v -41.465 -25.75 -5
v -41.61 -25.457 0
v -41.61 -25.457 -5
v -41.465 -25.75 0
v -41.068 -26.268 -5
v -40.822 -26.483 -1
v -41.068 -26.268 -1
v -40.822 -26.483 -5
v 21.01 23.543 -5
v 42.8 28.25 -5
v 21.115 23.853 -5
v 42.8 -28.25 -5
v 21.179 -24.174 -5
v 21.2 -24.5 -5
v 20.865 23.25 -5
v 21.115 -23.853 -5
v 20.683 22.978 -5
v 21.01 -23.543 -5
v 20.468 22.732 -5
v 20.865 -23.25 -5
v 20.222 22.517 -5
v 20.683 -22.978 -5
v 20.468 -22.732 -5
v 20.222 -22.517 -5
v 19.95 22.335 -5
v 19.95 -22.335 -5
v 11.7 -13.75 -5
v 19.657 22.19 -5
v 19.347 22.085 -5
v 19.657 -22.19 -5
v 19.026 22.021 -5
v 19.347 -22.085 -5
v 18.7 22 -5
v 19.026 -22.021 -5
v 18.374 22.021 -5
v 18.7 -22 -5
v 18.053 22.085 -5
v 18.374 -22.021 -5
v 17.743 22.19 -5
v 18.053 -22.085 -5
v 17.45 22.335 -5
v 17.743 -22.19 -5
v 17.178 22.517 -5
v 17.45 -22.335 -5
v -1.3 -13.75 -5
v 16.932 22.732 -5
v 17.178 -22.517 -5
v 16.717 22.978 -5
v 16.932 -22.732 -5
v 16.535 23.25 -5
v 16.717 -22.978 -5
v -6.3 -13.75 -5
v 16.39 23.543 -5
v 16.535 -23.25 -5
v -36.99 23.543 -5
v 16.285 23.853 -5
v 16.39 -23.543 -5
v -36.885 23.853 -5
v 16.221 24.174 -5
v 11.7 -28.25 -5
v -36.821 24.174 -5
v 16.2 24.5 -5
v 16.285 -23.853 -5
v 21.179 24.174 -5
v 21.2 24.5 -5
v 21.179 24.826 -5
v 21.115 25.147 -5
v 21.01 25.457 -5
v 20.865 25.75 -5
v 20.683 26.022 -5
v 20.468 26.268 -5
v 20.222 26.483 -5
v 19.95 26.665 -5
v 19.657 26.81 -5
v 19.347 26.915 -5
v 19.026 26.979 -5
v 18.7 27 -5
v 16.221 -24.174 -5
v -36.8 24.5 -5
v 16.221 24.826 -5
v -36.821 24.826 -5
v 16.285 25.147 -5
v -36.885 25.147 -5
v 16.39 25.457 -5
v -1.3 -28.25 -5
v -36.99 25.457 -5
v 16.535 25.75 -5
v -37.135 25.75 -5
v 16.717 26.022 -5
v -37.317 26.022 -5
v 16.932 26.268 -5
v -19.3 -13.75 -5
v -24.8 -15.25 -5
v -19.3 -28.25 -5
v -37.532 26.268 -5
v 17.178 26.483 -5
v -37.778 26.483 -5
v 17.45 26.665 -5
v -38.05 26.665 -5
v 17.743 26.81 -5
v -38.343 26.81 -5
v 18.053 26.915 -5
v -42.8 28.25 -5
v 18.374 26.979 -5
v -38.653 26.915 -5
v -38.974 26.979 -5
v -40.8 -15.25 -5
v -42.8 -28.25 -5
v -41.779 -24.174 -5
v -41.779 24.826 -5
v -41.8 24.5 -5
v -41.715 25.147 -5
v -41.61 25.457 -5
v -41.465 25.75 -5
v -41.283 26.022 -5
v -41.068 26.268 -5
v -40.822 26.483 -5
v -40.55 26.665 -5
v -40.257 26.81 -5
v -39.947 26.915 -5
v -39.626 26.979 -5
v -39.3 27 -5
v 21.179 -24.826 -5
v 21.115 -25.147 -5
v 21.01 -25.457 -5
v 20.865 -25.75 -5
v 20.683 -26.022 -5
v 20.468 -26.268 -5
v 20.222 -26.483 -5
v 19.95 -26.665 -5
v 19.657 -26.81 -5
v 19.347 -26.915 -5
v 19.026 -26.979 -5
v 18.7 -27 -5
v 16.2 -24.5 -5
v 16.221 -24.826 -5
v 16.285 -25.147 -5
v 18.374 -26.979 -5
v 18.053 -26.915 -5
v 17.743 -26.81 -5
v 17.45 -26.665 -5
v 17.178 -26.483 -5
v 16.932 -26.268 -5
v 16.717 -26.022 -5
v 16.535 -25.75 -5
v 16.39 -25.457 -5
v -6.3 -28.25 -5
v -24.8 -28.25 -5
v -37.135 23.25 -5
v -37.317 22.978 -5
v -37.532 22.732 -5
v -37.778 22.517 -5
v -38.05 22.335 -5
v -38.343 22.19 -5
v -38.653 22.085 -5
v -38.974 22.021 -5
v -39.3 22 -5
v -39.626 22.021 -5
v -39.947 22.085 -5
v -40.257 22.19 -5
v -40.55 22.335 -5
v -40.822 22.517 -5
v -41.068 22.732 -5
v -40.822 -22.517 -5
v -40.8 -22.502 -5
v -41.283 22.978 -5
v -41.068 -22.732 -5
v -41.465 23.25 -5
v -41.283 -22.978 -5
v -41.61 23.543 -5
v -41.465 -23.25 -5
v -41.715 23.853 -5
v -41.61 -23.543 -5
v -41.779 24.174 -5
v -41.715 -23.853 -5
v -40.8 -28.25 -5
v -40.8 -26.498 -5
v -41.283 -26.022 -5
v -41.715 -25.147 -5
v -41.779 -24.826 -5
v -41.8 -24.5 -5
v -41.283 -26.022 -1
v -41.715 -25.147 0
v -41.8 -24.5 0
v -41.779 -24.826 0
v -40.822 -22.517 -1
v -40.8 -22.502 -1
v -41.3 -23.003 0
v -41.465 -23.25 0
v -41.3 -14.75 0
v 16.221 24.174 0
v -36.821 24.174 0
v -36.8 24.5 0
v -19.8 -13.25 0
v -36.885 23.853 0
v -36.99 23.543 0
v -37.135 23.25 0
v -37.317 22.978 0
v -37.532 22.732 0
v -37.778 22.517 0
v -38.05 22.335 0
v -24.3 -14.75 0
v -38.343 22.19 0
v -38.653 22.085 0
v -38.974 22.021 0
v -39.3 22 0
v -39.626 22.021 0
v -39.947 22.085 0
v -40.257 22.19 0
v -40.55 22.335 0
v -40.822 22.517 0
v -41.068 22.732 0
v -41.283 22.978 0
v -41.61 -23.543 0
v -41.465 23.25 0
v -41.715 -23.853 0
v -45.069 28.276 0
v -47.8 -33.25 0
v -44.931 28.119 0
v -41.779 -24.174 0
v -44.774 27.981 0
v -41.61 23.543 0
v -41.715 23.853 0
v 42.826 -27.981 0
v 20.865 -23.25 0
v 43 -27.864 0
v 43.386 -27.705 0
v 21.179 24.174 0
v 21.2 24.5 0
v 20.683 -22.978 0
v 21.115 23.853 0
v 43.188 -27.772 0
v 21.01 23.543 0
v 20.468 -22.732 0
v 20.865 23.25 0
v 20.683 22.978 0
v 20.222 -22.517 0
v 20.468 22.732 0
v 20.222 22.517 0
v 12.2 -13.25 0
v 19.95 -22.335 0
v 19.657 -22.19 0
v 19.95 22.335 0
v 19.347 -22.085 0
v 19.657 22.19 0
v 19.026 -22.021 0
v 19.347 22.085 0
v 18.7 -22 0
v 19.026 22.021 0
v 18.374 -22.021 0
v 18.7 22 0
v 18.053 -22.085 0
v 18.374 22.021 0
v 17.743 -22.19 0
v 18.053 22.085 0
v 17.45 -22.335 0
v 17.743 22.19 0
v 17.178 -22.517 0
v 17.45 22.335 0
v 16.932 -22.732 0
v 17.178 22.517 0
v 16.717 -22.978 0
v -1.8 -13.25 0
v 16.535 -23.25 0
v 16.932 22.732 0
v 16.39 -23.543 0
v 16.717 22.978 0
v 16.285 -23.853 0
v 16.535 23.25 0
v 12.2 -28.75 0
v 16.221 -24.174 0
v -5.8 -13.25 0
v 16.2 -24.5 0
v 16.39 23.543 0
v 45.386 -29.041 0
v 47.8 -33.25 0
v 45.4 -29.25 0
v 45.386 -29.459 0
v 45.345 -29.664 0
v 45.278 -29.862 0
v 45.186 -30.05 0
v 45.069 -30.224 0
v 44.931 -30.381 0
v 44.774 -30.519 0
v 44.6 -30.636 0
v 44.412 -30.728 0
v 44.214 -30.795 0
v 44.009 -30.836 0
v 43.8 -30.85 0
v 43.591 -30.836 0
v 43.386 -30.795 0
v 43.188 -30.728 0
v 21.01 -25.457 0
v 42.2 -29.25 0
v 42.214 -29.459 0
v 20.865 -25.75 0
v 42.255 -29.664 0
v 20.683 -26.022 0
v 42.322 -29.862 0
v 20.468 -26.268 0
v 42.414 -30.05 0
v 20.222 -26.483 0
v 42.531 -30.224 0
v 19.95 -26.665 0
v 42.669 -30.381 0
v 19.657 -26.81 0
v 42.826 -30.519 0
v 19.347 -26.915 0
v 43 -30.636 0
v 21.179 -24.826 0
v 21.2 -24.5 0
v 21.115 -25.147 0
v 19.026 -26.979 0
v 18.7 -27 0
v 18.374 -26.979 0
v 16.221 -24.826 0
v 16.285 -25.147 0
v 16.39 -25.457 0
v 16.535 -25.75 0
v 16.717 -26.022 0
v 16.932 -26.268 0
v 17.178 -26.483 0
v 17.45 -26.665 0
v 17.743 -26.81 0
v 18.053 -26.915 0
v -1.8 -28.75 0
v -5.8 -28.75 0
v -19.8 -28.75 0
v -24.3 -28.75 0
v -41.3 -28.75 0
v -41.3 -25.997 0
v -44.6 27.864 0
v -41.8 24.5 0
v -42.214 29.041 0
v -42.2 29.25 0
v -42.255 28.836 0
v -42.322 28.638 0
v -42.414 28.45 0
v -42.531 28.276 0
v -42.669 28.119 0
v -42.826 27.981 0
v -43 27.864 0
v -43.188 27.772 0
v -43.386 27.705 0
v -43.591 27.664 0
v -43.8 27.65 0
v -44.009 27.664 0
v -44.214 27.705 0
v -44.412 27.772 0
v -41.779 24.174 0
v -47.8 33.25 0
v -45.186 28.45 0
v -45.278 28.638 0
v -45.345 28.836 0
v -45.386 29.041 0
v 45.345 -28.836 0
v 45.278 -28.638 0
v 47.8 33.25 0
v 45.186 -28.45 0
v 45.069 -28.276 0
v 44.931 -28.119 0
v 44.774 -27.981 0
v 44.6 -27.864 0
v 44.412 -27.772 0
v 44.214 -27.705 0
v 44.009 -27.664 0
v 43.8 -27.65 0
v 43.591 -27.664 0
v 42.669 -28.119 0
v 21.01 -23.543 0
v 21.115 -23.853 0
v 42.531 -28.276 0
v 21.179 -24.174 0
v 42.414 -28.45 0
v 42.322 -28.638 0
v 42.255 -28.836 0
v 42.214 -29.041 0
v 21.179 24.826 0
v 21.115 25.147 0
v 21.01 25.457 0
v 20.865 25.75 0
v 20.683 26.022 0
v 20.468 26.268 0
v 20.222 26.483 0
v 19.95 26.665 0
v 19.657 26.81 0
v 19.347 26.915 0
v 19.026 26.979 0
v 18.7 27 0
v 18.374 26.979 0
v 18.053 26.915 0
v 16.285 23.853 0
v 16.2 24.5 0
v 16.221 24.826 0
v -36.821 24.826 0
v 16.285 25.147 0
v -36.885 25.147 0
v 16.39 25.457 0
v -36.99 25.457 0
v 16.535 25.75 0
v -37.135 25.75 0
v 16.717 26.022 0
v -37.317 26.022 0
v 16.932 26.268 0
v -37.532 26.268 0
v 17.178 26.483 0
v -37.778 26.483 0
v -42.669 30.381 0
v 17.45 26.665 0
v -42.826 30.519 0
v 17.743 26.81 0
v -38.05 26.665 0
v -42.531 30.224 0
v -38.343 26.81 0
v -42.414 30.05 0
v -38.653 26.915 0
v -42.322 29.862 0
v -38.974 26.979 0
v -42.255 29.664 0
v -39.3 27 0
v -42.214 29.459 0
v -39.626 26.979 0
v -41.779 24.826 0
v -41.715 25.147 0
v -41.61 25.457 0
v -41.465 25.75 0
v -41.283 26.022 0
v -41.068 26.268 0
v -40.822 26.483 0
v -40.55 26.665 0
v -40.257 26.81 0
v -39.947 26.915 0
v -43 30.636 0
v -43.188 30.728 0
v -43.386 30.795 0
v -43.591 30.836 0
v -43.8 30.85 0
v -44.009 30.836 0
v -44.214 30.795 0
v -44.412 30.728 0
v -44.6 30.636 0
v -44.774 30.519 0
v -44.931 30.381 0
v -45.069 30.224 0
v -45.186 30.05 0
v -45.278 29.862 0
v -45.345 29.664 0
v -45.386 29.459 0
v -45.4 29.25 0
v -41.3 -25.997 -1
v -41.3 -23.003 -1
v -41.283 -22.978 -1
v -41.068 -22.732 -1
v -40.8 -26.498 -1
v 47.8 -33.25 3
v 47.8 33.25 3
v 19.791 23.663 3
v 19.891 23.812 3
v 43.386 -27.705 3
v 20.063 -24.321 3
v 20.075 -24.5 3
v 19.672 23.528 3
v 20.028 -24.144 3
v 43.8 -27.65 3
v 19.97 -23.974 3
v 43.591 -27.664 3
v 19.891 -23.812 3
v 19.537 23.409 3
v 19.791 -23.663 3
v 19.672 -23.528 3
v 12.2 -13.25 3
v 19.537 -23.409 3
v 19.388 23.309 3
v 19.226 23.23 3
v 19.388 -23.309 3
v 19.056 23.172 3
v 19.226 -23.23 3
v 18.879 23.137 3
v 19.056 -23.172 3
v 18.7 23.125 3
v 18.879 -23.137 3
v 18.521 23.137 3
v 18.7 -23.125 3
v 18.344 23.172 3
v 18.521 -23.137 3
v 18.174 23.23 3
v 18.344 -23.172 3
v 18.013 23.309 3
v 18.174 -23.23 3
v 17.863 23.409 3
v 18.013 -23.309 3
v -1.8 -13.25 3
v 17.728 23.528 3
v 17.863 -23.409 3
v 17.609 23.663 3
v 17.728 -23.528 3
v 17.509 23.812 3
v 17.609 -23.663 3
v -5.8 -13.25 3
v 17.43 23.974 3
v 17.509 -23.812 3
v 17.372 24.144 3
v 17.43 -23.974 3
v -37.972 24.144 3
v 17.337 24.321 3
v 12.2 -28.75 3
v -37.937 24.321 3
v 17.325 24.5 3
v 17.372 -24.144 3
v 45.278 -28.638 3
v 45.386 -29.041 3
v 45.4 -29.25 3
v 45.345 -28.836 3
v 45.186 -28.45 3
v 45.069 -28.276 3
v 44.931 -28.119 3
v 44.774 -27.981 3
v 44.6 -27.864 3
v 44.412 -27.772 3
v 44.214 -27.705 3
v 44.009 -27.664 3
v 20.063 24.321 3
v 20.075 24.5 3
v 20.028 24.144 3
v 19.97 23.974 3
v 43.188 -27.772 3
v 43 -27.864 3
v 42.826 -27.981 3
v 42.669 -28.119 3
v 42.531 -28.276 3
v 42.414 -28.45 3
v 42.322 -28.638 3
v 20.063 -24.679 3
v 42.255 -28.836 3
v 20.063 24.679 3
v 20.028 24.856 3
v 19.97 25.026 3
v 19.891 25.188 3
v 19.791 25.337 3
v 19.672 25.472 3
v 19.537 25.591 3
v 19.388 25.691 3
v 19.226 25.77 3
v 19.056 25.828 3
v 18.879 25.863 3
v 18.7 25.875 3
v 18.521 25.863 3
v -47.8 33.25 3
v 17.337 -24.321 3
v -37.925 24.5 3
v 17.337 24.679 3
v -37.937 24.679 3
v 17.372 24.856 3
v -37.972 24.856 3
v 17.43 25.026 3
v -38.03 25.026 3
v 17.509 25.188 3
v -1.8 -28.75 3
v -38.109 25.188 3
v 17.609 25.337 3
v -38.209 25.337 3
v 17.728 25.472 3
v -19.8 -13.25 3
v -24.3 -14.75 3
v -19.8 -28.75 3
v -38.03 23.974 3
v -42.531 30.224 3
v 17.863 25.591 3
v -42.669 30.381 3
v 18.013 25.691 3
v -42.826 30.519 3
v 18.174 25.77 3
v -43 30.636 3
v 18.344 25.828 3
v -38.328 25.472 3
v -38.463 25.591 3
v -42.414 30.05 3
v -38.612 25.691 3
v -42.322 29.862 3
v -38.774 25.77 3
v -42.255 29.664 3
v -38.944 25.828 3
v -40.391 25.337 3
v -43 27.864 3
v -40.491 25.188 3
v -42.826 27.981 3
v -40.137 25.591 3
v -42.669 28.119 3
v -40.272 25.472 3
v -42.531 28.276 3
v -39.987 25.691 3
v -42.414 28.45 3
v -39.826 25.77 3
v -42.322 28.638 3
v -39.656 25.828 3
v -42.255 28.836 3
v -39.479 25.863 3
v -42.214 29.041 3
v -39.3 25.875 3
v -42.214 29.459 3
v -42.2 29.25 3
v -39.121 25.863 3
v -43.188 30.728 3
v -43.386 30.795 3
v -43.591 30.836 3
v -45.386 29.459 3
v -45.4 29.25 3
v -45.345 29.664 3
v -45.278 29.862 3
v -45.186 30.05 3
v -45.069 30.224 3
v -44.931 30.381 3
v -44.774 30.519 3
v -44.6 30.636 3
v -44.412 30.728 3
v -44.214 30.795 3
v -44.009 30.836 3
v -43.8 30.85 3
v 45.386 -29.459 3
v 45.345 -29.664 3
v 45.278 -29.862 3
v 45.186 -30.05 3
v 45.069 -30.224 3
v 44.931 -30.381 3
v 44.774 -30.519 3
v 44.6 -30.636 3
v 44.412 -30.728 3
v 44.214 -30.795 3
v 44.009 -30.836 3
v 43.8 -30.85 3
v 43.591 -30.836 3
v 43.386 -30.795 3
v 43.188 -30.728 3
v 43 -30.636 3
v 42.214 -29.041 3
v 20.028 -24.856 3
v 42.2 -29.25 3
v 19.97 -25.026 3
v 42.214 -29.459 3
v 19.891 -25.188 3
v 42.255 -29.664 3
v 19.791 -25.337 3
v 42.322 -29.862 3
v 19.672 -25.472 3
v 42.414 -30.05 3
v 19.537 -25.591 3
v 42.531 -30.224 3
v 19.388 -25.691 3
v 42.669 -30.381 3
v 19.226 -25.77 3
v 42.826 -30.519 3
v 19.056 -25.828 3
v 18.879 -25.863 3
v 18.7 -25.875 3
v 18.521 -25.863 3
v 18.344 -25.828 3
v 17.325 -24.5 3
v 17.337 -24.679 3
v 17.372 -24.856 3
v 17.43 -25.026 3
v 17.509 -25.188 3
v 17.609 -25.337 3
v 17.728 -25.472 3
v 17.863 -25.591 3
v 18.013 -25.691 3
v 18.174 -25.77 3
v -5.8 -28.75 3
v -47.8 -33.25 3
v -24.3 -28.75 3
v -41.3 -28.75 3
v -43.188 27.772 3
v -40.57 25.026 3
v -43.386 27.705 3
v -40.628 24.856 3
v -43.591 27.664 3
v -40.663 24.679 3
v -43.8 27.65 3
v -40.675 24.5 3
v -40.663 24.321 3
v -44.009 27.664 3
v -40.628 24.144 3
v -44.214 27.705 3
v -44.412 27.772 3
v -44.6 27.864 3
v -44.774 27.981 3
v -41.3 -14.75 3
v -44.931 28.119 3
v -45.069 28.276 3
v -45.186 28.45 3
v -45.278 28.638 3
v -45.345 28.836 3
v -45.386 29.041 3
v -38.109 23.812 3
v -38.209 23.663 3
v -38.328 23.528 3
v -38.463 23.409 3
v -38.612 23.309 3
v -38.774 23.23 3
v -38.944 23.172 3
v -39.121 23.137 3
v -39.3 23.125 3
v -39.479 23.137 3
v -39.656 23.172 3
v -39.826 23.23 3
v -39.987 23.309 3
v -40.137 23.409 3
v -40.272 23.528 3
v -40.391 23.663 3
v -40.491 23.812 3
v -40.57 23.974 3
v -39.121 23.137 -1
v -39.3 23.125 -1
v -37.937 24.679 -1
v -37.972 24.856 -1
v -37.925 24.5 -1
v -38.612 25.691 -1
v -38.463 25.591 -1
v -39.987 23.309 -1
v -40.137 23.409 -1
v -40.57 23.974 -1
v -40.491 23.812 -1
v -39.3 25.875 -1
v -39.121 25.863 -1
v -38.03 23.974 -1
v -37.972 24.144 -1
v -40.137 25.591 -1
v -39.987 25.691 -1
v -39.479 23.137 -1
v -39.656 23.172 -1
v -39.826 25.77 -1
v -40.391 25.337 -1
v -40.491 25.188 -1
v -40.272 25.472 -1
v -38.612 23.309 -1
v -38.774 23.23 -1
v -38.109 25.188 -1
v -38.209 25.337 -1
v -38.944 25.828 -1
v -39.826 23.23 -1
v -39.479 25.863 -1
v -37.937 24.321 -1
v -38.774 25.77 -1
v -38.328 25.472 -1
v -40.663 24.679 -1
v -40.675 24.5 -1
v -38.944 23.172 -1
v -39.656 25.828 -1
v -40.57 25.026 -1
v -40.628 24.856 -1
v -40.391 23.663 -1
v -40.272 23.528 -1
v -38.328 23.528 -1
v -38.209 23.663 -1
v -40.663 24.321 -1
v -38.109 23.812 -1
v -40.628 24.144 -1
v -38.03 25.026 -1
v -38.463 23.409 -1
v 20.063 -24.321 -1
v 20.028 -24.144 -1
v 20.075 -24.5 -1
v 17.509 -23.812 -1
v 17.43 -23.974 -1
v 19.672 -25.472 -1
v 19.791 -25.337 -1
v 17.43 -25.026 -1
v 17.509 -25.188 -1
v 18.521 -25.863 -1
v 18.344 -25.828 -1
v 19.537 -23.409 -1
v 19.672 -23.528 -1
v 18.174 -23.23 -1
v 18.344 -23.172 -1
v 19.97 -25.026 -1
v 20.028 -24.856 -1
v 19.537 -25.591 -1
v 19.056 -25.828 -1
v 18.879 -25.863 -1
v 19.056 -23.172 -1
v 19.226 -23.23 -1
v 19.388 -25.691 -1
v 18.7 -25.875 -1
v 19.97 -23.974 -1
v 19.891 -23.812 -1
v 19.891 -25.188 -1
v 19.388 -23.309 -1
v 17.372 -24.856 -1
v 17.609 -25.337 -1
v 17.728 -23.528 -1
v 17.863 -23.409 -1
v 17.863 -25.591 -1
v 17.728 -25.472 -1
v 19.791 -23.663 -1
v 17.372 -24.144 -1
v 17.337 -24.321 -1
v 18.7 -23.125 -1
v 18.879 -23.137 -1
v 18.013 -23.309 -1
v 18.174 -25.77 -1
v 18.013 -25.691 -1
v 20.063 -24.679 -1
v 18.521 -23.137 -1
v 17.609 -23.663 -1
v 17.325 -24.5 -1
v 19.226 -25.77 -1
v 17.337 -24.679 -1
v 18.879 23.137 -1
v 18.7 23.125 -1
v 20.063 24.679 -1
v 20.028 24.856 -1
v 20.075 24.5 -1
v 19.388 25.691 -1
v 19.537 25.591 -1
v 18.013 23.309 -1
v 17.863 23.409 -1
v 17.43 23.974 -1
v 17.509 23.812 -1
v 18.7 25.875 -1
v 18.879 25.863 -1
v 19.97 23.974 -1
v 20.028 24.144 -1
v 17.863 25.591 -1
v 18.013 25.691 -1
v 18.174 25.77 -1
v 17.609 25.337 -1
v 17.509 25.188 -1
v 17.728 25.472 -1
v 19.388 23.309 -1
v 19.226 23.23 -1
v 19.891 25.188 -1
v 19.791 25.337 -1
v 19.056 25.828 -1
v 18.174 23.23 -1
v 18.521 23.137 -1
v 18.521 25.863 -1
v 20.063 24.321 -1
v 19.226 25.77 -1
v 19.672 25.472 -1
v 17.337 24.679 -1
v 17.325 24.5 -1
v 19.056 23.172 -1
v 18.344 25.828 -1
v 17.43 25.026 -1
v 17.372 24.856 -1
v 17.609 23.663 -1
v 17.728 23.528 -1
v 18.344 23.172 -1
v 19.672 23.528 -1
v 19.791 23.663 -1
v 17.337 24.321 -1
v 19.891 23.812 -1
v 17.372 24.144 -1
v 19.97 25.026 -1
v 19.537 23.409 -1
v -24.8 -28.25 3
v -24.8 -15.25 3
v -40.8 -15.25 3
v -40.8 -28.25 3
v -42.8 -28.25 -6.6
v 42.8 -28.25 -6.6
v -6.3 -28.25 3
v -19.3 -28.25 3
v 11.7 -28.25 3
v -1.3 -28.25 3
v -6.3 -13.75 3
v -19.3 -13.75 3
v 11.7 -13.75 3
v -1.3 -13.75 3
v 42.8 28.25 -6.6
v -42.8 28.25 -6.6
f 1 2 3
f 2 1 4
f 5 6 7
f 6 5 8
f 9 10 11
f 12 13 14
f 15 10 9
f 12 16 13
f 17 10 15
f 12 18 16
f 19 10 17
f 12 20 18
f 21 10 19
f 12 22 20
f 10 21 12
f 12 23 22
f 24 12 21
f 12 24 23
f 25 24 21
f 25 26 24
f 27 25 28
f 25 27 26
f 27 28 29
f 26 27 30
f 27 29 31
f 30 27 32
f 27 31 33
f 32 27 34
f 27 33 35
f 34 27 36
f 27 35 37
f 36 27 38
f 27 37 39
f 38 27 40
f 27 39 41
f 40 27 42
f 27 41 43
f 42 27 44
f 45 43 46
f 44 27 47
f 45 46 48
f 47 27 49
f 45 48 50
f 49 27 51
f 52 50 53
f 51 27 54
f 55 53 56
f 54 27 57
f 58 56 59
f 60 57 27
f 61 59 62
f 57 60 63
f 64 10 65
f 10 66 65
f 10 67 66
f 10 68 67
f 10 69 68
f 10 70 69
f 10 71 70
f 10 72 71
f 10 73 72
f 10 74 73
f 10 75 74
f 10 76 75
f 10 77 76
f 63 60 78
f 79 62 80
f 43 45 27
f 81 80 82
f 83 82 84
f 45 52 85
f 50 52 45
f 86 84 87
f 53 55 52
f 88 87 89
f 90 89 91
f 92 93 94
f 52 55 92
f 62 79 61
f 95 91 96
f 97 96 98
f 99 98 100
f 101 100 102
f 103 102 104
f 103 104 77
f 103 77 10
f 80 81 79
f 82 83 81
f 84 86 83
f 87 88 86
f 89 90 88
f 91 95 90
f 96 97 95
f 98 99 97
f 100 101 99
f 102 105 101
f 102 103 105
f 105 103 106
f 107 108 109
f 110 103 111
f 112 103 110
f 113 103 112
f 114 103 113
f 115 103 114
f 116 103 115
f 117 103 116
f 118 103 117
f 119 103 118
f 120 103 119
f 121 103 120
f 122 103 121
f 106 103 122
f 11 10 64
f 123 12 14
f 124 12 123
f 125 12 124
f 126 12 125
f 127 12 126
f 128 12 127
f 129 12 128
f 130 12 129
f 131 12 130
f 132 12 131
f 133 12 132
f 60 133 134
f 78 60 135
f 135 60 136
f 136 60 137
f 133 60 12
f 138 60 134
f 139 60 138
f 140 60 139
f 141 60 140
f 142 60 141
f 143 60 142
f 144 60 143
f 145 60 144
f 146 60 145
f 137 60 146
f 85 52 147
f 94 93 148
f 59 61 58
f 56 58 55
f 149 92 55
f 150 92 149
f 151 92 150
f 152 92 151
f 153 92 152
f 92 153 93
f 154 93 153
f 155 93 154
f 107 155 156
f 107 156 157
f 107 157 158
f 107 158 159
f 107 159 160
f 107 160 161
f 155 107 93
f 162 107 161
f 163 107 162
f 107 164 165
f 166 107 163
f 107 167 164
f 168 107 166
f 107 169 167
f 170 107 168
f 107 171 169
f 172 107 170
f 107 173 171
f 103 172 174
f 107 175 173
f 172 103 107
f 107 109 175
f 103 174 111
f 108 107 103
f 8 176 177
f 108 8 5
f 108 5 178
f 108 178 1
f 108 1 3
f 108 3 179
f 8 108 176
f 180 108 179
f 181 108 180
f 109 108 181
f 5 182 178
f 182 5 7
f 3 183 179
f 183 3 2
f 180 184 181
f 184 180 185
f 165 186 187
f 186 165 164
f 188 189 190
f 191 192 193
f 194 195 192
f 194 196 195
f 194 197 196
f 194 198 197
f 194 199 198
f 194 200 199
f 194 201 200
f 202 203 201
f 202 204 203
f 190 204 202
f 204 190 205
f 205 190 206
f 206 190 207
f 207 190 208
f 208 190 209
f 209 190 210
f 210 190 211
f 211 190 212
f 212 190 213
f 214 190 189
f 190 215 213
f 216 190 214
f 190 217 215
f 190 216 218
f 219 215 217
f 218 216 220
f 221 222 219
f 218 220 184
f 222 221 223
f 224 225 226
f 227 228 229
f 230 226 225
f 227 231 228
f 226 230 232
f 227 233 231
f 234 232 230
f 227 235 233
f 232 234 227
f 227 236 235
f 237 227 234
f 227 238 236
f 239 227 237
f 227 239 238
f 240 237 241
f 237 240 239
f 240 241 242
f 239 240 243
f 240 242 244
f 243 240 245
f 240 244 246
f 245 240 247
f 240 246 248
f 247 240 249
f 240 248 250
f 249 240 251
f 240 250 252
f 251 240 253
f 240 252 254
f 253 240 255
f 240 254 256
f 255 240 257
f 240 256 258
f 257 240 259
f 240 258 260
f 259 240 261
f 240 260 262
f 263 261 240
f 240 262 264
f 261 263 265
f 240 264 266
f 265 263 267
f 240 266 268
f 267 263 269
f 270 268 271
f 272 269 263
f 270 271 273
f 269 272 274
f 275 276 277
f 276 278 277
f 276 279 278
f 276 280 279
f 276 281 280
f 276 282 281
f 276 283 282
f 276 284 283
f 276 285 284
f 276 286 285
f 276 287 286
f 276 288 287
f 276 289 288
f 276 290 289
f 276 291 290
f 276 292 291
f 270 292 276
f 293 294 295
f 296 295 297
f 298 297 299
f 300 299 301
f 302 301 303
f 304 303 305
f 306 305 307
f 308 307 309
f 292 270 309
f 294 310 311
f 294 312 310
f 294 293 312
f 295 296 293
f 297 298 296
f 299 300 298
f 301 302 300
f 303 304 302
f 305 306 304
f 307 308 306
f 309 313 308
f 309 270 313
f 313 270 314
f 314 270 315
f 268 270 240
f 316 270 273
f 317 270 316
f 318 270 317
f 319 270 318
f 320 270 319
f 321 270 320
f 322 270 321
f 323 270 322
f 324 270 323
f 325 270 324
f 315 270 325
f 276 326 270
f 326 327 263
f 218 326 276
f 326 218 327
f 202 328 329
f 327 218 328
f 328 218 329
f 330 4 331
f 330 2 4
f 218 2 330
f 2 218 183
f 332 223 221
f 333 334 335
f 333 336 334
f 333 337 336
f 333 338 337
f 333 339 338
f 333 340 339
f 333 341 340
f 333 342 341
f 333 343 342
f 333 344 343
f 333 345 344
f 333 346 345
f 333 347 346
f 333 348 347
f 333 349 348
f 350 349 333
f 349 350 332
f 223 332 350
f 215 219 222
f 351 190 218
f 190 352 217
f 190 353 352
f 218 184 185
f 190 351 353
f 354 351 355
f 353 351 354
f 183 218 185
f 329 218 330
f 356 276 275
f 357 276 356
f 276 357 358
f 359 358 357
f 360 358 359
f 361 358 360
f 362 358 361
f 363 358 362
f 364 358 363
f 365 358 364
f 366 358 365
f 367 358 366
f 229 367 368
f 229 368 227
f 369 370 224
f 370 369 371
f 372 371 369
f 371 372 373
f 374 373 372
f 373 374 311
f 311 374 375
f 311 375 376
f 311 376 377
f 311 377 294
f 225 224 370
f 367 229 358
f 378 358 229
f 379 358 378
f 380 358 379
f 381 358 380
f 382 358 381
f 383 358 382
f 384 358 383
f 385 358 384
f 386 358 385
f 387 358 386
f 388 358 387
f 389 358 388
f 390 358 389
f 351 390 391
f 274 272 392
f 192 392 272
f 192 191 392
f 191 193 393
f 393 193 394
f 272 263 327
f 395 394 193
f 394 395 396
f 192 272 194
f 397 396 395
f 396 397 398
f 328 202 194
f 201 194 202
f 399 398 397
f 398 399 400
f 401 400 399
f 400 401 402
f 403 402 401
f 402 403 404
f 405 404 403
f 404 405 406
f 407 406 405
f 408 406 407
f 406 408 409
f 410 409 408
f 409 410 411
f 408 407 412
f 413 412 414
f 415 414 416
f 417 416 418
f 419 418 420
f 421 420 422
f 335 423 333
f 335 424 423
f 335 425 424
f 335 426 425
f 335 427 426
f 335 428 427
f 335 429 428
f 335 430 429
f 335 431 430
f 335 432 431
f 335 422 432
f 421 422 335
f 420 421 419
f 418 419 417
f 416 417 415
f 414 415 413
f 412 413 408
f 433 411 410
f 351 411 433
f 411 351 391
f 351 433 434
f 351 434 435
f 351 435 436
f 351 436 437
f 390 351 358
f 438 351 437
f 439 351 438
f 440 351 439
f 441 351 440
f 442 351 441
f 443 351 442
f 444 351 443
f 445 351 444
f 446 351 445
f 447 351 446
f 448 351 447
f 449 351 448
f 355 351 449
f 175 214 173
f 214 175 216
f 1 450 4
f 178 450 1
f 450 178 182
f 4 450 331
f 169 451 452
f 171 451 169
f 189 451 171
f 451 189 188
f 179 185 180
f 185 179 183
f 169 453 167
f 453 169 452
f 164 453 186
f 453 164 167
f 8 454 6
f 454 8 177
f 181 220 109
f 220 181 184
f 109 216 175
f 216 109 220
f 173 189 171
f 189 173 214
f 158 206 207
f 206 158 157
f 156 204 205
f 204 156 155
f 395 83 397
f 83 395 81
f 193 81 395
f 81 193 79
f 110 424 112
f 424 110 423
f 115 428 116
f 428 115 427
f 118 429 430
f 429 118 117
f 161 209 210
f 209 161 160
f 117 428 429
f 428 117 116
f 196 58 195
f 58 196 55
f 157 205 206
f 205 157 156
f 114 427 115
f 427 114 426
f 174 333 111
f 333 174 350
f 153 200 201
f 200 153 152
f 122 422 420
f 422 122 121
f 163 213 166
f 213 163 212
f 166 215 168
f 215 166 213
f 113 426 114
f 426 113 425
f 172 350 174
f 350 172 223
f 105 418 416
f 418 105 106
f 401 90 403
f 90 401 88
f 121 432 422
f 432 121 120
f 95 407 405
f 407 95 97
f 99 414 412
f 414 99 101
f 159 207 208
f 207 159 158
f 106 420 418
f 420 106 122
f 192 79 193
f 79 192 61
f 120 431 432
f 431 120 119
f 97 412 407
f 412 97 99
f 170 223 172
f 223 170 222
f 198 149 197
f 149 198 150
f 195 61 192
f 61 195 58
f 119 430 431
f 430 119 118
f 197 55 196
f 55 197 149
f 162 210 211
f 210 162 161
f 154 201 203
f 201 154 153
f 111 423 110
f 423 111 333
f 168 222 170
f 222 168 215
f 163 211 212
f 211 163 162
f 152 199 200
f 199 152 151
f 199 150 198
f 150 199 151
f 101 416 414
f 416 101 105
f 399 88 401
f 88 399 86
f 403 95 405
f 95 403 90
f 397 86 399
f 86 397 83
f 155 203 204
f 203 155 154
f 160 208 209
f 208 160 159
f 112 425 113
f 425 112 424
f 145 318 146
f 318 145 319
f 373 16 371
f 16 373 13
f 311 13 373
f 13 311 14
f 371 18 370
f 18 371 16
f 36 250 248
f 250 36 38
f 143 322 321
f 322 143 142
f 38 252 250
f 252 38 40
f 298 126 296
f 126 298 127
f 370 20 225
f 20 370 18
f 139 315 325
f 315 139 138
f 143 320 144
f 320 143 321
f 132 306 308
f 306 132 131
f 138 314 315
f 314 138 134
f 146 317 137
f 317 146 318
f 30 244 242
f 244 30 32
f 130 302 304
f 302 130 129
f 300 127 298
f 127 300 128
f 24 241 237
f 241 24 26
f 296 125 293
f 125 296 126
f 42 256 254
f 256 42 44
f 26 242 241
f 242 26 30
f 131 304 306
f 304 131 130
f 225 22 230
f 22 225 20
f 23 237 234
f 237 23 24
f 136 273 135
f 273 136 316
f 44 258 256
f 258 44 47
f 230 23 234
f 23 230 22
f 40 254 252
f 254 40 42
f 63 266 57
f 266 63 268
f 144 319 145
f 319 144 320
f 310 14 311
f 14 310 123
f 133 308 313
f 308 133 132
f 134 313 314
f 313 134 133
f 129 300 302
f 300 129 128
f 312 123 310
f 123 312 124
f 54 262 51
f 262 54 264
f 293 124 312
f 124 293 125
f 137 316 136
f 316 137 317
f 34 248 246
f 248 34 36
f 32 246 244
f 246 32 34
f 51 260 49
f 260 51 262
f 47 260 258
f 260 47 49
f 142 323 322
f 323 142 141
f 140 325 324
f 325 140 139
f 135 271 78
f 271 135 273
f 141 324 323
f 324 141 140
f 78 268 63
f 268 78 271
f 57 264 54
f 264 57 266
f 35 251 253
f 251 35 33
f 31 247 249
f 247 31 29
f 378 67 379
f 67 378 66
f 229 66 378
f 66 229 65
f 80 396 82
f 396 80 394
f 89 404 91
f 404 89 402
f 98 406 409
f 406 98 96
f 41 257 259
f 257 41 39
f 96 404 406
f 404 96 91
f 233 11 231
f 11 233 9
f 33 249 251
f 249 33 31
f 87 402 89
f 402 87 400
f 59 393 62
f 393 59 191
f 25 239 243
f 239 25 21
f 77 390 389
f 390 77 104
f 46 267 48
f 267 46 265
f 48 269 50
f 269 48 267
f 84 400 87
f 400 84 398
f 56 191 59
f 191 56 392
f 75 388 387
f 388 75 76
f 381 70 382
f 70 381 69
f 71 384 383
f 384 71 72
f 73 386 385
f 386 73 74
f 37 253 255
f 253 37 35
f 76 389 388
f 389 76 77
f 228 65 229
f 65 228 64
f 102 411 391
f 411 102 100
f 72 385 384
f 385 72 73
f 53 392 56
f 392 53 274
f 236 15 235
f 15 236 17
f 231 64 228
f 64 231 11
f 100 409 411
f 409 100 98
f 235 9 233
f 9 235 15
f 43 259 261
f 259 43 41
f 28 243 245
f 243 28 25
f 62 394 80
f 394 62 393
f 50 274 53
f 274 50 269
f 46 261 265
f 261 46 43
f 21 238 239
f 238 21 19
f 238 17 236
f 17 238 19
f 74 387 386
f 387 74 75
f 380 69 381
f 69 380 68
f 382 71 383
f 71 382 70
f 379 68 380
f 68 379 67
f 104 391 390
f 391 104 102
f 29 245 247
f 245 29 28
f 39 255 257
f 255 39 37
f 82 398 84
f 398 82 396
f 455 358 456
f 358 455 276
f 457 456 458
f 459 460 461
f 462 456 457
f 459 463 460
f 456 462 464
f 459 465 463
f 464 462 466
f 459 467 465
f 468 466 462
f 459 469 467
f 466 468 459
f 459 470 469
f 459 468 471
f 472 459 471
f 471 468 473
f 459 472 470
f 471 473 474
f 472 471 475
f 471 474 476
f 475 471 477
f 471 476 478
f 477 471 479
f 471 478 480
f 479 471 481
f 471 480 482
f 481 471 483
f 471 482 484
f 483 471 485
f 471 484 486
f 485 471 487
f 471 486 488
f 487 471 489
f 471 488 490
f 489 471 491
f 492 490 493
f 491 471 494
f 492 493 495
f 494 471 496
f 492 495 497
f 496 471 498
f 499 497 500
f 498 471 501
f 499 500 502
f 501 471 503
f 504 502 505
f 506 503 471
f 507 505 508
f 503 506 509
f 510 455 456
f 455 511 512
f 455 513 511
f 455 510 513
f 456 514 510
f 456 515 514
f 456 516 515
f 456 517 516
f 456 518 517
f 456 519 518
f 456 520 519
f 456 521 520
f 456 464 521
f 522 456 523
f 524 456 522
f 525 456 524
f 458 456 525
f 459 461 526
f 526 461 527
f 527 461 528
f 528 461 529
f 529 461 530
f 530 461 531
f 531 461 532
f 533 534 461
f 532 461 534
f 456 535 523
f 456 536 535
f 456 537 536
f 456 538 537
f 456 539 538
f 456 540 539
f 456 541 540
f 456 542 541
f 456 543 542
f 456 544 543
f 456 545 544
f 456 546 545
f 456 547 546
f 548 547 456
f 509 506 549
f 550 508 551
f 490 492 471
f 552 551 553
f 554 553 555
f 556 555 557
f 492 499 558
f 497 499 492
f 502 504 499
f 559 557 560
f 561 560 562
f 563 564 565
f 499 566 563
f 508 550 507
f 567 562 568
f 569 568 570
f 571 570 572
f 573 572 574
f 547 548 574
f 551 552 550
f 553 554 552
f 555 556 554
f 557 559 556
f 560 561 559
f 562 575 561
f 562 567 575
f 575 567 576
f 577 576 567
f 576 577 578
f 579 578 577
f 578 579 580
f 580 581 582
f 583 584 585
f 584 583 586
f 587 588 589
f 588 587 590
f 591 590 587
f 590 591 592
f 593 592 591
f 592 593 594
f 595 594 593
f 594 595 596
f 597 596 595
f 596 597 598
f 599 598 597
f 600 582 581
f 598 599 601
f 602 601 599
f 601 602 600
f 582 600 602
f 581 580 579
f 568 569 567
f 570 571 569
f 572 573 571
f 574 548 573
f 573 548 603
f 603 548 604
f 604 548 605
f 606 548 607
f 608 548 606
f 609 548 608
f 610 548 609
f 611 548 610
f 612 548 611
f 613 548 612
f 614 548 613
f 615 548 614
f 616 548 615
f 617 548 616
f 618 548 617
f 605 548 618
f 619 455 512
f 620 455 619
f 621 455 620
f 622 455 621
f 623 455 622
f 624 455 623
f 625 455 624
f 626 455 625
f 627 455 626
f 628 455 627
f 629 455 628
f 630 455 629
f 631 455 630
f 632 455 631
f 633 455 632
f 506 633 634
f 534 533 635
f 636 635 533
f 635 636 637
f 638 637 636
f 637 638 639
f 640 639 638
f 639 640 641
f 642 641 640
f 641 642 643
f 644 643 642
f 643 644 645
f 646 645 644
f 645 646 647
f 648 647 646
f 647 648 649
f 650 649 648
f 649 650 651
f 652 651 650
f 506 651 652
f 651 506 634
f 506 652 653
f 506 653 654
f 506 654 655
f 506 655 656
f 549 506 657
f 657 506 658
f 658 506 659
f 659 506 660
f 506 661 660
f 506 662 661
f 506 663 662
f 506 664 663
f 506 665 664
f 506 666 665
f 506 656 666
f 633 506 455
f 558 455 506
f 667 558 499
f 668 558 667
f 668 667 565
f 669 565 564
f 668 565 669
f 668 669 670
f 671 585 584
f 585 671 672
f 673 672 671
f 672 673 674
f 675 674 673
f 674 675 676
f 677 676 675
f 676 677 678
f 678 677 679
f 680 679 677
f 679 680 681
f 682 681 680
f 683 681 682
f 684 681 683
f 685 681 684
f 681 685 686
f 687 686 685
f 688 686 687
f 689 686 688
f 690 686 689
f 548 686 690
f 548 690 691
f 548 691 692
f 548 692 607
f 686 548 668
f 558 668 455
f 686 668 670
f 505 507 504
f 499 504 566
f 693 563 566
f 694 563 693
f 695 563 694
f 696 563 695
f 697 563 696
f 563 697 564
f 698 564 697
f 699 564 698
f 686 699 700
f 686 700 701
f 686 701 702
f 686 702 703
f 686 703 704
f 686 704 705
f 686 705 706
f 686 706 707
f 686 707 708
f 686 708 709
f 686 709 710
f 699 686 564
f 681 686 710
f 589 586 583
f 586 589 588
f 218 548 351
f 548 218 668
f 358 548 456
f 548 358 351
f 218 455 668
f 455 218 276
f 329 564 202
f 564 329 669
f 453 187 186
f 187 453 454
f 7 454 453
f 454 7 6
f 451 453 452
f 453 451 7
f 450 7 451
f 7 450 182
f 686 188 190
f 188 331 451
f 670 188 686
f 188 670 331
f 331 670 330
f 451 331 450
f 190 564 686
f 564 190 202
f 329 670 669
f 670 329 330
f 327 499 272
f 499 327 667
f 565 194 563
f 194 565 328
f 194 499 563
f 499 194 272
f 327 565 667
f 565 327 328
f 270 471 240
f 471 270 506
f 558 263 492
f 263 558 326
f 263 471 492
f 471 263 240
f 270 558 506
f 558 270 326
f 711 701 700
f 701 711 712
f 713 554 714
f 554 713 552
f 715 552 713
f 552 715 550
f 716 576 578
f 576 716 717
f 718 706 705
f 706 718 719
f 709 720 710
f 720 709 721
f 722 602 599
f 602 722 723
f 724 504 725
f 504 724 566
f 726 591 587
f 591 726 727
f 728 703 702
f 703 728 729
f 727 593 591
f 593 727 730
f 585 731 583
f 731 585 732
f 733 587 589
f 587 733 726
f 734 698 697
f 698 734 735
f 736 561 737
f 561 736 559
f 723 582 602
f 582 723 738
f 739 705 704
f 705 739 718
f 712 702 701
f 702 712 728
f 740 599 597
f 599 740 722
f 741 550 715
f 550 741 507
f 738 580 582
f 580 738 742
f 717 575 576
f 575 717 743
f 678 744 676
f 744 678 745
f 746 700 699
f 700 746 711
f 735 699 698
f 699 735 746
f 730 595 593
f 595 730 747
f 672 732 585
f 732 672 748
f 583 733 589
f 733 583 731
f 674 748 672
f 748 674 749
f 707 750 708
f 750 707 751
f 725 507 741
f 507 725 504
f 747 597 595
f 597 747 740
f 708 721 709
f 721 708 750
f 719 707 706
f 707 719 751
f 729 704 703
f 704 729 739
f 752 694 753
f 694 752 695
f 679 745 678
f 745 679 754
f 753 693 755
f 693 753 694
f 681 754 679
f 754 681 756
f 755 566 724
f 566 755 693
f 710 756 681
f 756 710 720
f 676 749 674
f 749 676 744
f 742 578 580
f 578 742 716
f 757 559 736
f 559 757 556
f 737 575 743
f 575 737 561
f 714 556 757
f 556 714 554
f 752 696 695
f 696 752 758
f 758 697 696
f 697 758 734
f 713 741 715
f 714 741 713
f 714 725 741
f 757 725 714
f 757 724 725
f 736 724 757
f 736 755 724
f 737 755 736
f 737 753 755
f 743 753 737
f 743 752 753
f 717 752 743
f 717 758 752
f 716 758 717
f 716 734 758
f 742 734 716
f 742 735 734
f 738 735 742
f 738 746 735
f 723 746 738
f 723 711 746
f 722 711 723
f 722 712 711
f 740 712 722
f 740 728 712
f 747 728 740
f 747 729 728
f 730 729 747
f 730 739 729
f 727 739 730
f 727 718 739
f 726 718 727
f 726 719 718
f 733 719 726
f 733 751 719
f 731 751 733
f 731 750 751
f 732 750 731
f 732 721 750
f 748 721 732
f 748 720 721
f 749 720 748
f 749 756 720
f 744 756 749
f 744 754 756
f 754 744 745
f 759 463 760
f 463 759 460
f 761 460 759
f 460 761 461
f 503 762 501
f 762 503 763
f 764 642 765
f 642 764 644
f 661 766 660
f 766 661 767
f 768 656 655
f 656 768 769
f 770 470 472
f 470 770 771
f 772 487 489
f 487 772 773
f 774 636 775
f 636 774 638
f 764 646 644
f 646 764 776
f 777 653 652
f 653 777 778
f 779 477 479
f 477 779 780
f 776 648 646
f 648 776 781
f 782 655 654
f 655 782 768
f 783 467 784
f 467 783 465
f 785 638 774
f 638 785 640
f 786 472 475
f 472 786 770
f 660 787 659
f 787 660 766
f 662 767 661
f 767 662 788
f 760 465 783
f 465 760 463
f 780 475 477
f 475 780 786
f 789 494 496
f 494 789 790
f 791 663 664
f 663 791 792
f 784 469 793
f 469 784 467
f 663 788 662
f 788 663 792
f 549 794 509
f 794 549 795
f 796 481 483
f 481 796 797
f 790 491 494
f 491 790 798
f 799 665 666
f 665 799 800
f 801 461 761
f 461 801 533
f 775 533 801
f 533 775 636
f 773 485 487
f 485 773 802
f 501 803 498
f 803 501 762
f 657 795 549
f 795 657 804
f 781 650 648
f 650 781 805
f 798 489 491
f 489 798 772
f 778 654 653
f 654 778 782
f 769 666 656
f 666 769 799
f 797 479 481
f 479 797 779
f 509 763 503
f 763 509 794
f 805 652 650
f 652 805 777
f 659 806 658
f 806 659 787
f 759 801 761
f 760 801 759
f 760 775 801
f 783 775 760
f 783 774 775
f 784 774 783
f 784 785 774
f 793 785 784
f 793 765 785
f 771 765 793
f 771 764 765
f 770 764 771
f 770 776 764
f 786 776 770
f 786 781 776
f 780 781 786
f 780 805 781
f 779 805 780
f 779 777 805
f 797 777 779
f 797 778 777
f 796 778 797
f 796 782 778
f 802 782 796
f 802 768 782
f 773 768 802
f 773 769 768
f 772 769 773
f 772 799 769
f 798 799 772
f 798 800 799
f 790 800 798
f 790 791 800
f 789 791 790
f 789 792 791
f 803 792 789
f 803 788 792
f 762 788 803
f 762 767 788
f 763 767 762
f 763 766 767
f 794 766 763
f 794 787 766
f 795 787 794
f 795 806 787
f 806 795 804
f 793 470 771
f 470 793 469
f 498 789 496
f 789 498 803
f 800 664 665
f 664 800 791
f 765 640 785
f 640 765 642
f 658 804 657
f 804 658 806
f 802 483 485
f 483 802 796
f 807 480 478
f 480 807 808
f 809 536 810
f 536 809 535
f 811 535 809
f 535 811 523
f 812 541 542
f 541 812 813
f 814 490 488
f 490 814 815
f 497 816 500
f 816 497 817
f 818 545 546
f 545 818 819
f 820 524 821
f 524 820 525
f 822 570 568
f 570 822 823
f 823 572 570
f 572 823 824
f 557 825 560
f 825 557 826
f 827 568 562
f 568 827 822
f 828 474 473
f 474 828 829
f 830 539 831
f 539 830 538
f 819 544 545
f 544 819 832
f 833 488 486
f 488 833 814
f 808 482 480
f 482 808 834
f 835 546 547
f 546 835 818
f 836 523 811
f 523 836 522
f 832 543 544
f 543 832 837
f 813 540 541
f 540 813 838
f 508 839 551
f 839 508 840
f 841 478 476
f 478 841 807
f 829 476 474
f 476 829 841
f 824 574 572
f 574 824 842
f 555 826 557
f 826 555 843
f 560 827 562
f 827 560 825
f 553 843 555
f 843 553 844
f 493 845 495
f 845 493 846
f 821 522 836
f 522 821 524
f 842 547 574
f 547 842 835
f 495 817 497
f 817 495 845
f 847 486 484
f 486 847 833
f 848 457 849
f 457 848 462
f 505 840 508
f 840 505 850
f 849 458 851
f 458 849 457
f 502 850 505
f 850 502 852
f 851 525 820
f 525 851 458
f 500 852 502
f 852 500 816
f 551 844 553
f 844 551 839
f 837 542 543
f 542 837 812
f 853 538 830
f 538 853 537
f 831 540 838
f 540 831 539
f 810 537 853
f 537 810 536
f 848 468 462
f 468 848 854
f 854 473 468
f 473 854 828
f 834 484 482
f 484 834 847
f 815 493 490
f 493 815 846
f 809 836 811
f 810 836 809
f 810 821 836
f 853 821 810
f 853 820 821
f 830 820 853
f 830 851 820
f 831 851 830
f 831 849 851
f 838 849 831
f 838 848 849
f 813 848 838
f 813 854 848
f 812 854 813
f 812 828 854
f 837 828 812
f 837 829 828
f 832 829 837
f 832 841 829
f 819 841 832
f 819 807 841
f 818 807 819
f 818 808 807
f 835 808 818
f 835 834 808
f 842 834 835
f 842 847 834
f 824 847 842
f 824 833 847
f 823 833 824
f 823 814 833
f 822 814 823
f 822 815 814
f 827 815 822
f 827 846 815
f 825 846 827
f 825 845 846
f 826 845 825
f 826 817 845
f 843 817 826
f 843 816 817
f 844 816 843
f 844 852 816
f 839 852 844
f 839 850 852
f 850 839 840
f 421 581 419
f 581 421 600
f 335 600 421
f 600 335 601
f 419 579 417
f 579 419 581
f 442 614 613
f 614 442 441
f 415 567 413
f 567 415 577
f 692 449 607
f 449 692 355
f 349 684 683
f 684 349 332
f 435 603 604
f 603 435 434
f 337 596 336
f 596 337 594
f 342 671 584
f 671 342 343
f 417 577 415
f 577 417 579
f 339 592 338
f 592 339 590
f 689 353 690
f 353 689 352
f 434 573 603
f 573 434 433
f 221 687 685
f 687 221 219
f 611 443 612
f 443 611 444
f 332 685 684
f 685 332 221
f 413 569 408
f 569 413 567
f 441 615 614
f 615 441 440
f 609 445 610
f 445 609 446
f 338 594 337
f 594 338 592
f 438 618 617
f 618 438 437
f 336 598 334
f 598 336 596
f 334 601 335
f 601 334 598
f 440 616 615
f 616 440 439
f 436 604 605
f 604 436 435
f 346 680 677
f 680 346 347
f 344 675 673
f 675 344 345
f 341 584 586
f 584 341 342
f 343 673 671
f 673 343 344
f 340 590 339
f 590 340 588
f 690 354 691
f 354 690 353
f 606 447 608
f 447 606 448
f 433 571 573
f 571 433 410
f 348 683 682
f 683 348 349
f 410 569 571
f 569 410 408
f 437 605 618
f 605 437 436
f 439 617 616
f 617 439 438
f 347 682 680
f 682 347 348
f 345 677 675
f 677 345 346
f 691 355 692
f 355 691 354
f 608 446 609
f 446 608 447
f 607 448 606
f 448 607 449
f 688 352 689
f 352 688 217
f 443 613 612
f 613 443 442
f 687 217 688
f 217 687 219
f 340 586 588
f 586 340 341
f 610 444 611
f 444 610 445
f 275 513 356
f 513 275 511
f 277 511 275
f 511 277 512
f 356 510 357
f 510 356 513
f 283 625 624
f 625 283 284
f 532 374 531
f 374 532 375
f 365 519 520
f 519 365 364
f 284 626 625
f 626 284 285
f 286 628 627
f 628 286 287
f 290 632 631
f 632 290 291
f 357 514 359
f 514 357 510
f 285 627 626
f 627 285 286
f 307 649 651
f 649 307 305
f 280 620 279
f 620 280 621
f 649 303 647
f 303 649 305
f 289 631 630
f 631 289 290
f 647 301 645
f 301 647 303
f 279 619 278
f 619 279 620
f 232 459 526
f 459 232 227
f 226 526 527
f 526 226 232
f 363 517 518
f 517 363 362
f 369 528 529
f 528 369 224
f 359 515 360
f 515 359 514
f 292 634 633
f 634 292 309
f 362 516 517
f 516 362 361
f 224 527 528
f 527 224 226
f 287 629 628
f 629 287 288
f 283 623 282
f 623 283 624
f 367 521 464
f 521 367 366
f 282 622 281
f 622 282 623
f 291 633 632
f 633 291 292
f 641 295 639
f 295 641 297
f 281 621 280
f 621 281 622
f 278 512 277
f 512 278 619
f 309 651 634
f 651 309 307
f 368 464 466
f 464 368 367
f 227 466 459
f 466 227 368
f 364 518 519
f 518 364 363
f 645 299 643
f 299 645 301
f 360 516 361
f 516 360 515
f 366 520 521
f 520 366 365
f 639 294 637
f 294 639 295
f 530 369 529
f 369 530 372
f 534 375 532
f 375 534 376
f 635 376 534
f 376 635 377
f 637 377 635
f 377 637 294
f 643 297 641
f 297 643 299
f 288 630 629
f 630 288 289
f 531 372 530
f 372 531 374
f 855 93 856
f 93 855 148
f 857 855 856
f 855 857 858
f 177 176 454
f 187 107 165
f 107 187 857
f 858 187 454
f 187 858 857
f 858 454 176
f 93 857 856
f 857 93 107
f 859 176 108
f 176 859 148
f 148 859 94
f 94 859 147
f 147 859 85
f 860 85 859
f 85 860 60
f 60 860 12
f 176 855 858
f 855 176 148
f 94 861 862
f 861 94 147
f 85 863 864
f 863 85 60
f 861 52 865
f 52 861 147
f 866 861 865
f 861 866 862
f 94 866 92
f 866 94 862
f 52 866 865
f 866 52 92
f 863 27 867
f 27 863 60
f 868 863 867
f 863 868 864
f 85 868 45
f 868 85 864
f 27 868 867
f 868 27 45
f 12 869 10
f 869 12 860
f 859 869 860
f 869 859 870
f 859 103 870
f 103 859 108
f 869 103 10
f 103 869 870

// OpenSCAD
// =============================================================================
// CONSOLE10 — Raspberry Pi 2B / 3B Bracket  v0.3  (flat panel + rear standoffs)
//
// Parametric bracket for the Raspberry Pi 2B (also fits Pi 3B / 3B+ — same B+
// form factor with 85.6 × 56.5 mm board, 58 × 49 mm M2.5 mounting pattern).
//
// DESIGN — flat panel, Pi behind it, parallel mount:
//   - Front face (operator side) at Z = +panel_t
//   - Panel back face at Z = 0
//   - 4 standoffs project rearward from the panel back to Z = -standoff_h
//   - Pi PCB sits at the top of the standoffs, PARALLEL to the panel
//   - Pi's USB + RJ45 ports stick UP from the PCB *toward* the panel
//     and exit through 3 cutouts in the panel face
//   - 4 M2.5 screws thread from the FRONT face into the standoffs
//   - 2 corner mounting holes attach the bracket to a 2U faceplate slot
//
// LAYOUT (looking at the panel face from the front):
//   X = horizontal (Pi long axis lies along X, 85.6 mm)
//   Y = vertical   (Pi short axis lies along Y, 56.5 mm; USB+ETH edge at Y_min)
//   Z = depth      (panel face at +Z, bracket extends in -Z)
//
// PORT POSITIONS (Pi USB+RJ45 along ONE long edge — needs calipers verification):
//   RJ45 ethernet     ~16 × 12 mm, X center ≈ 10 mm from Pi left corner
//   USB stack 1       ~13 × 14 mm, X center ≈ 30 mm
//   USB stack 2       ~13 × 14 mm, X center ≈ 48 mm
// =============================================================================

// ---------- Pi 2B board geometry (B+ form factor) ----------
pi_w           = 85.6;     // long axis (along panel X)
pi_h           = 56.5;     // short axis (along panel Y)
pi_pcb_t       = 1.6;

// ---------- Pi mounting hole pattern ----------
// Hole pattern is 58 × 49 mm, OFFSET on the long axis: 3.5 from one short
// edge, 24.1 from the other (USB-stack side has the 24.1 offset).
mount_xspan    = 58;       // along Pi long axis (= panel X)
mount_yspan    = 49;       // along Pi short axis (= panel Y)
mount_xinset_L = 3.5;      // X inset from Pi LEFT short edge (the non-USB end)
mount_yinset   = 3.75;     // Y inset from each long edge (56.5 - 49) / 2
m25_clear      = 2.75;     // M2.5 clearance hole (also drilled in the Pi)

// ---------- Pi placement on panel (Pi PCB centered on panel) ----------
// Pi origin (left/bottom corner) in panel coords
pi_origin_x    = -pi_w/2;
pi_origin_y    = -pi_h/2;

// ---------- Port positions (X from Pi LEFT corner, along long edge with USB+ETH) ----------
// TUNE THESE — calipers on a real Pi 2B will give exact values.
rj45_xc        = 10;       rj45_w  = 16;    rj45_h  = 13;
usb1_xc        = 30;       usb1_w  = 13;    usb1_h  = 14.5;
usb2_xc        = 48;       usb2_w  = 13;    usb2_h  = 14.5;
port_clr       = 0.5;      // per-side cutout clearance
// USB+RJ45 edge of Pi: at Y=0 in Pi coords (the LONG edge opposite GPIO)
ports_y_edge   = pi_origin_y;   // panel-Y of Pi's port-side long edge

// ---------- standoff ----------
standoff_d     = 5;        // outer diameter
standoff_h     = 5;        // distance from panel back to Pi PCB

// ---------- panel envelope ----------
panel_margin_x = 5;        // X margin around Pi
panel_margin_y = 5;        // Y margin around Pi
panel_w        = pi_w + 2*panel_margin_x;     // 95.6
panel_h        = pi_h + 2*panel_margin_y;     // 66.5
panel_t        = 3;

// ---------- faceplate-attachment mount holes ----------
fp_mount_d     = 3.2;      // M3 clearance
fp_mount_inset = 4;

show_pi        = true;
$fn            = 48;

// Derived: Pi mounting hole positions in panel coords
mount_hole_xs  = [pi_origin_x + mount_xinset_L,
                  pi_origin_x + mount_xinset_L + mount_xspan];
mount_hole_ys  = [pi_origin_y + mount_yinset,
                  pi_origin_y + mount_yinset + mount_yspan];

echo(str("PI 2B BRACKET v0.3 (parallel mount) | panel ", panel_w, " x ", panel_h, " x ", panel_t,
         " | standoff h=", standoff_h, " d=", standoff_d,
         " | Pi mount holes at X=", mount_hole_xs, " Y=", mount_hole_ys,
         " | ports: RJ45 xc=", rj45_xc, "  USB1 xc=", usb1_xc, "  USB2 xc=", usb2_xc));

// =============================================================================
// PORT CUTOUTS — rectangular openings on the panel face along the Pi's USB edge
// Each port cutout is centered horizontally at port_xc (Pi coords + offset),
// vertically just above the port-edge Y, with size port_w × port_h.
// =============================================================================
module port_cutouts() {
    for (p = [
        [rj45_xc,  rj45_w,  rj45_h],
        [usb1_xc,  usb1_w,  usb1_h],
        [usb2_xc,  usb2_w,  usb2_h]
    ]) {
        xc = pi_origin_x + p[0];
        yc = ports_y_edge + p[2]/2;
        translate([xc, yc, panel_t/2])
            cube([p[1] + 2*port_clr, p[2] + 2*port_clr, panel_t + 2], center = true);
    }
}

// =============================================================================
// PI MOUNTING HOLES — 4 small holes through the panel for M2.5 screws
// =============================================================================
module pi_mount_holes() {
    for (x = mount_hole_xs)
        for (y = mount_hole_ys)
            translate([x, y, panel_t/2])
                cylinder(d = m25_clear, h = panel_t + 2, center = true);
}

// =============================================================================
// STANDOFFS — 4 cylinders projecting REARWARD from panel back to PCB plane
// =============================================================================
module standoffs() {
    for (x = mount_hole_xs)
        for (y = mount_hole_ys)
            translate([x, y, -standoff_h])
                cylinder(d = standoff_d, h = standoff_h);
}

// =============================================================================
// FACEPLATE MOUNT HOLES — 2 small holes on diagonally-opposite panel corners
// =============================================================================
module fp_mount_holes() {
    for (corner = [[-1, +1], [+1, -1]]) {
        translate([corner[0] * (panel_w/2 - fp_mount_inset),
                   corner[1] * (panel_h/2 - fp_mount_inset),
                   panel_t/2])
            cylinder(d = fp_mount_d, h = panel_t + 2, center = true);
    }
}

// =============================================================================
// BRACKET
// =============================================================================
module pi2b_bracket() {
    difference() {
        union() {
            // panel slab
            translate([-panel_w/2, -panel_h/2, 0])
                cube([panel_w, panel_h, panel_t]);
            // 4 rear standoffs
            standoffs();
        }
        // cuts
        port_cutouts();
        pi_mount_holes();
        fp_mount_holes();
    }
}

// =============================================================================
// MOCK PI — fit-check only. PCB lies parallel to panel at Z = -standoff_h.
// =============================================================================
module pi_mock() {
    // PCB
    color("DarkGreen")
        translate([pi_origin_x, pi_origin_y, -standoff_h - pi_pcb_t])
            cube([pi_w, pi_h, pi_pcb_t]);

    // Port mocks — protrude UP from PCB toward panel, exiting through cutouts
    // Z range: from PCB top (z = -standoff_h) up to panel front (z = panel_t)
    for (p = [
        [rj45_xc,  rj45_w,  rj45_h, "Silver"],
        [usb1_xc,  usb1_w,  usb1_h, "DimGray"],
        [usb2_xc,  usb2_w,  usb2_h, "DimGray"]
    ]) {
        xc = pi_origin_x + p[0];
        yc = ports_y_edge + p[2]/2;
        color(p[3])
            translate([xc - p[1]/2, yc - p[2]/2, -standoff_h])
                cube([p[1], p[2], standoff_h + panel_t]);
    }
}

// ---------- render ----------
color("Gainsboro") pi2b_bracket();
if (show_pi) pi_mock();
